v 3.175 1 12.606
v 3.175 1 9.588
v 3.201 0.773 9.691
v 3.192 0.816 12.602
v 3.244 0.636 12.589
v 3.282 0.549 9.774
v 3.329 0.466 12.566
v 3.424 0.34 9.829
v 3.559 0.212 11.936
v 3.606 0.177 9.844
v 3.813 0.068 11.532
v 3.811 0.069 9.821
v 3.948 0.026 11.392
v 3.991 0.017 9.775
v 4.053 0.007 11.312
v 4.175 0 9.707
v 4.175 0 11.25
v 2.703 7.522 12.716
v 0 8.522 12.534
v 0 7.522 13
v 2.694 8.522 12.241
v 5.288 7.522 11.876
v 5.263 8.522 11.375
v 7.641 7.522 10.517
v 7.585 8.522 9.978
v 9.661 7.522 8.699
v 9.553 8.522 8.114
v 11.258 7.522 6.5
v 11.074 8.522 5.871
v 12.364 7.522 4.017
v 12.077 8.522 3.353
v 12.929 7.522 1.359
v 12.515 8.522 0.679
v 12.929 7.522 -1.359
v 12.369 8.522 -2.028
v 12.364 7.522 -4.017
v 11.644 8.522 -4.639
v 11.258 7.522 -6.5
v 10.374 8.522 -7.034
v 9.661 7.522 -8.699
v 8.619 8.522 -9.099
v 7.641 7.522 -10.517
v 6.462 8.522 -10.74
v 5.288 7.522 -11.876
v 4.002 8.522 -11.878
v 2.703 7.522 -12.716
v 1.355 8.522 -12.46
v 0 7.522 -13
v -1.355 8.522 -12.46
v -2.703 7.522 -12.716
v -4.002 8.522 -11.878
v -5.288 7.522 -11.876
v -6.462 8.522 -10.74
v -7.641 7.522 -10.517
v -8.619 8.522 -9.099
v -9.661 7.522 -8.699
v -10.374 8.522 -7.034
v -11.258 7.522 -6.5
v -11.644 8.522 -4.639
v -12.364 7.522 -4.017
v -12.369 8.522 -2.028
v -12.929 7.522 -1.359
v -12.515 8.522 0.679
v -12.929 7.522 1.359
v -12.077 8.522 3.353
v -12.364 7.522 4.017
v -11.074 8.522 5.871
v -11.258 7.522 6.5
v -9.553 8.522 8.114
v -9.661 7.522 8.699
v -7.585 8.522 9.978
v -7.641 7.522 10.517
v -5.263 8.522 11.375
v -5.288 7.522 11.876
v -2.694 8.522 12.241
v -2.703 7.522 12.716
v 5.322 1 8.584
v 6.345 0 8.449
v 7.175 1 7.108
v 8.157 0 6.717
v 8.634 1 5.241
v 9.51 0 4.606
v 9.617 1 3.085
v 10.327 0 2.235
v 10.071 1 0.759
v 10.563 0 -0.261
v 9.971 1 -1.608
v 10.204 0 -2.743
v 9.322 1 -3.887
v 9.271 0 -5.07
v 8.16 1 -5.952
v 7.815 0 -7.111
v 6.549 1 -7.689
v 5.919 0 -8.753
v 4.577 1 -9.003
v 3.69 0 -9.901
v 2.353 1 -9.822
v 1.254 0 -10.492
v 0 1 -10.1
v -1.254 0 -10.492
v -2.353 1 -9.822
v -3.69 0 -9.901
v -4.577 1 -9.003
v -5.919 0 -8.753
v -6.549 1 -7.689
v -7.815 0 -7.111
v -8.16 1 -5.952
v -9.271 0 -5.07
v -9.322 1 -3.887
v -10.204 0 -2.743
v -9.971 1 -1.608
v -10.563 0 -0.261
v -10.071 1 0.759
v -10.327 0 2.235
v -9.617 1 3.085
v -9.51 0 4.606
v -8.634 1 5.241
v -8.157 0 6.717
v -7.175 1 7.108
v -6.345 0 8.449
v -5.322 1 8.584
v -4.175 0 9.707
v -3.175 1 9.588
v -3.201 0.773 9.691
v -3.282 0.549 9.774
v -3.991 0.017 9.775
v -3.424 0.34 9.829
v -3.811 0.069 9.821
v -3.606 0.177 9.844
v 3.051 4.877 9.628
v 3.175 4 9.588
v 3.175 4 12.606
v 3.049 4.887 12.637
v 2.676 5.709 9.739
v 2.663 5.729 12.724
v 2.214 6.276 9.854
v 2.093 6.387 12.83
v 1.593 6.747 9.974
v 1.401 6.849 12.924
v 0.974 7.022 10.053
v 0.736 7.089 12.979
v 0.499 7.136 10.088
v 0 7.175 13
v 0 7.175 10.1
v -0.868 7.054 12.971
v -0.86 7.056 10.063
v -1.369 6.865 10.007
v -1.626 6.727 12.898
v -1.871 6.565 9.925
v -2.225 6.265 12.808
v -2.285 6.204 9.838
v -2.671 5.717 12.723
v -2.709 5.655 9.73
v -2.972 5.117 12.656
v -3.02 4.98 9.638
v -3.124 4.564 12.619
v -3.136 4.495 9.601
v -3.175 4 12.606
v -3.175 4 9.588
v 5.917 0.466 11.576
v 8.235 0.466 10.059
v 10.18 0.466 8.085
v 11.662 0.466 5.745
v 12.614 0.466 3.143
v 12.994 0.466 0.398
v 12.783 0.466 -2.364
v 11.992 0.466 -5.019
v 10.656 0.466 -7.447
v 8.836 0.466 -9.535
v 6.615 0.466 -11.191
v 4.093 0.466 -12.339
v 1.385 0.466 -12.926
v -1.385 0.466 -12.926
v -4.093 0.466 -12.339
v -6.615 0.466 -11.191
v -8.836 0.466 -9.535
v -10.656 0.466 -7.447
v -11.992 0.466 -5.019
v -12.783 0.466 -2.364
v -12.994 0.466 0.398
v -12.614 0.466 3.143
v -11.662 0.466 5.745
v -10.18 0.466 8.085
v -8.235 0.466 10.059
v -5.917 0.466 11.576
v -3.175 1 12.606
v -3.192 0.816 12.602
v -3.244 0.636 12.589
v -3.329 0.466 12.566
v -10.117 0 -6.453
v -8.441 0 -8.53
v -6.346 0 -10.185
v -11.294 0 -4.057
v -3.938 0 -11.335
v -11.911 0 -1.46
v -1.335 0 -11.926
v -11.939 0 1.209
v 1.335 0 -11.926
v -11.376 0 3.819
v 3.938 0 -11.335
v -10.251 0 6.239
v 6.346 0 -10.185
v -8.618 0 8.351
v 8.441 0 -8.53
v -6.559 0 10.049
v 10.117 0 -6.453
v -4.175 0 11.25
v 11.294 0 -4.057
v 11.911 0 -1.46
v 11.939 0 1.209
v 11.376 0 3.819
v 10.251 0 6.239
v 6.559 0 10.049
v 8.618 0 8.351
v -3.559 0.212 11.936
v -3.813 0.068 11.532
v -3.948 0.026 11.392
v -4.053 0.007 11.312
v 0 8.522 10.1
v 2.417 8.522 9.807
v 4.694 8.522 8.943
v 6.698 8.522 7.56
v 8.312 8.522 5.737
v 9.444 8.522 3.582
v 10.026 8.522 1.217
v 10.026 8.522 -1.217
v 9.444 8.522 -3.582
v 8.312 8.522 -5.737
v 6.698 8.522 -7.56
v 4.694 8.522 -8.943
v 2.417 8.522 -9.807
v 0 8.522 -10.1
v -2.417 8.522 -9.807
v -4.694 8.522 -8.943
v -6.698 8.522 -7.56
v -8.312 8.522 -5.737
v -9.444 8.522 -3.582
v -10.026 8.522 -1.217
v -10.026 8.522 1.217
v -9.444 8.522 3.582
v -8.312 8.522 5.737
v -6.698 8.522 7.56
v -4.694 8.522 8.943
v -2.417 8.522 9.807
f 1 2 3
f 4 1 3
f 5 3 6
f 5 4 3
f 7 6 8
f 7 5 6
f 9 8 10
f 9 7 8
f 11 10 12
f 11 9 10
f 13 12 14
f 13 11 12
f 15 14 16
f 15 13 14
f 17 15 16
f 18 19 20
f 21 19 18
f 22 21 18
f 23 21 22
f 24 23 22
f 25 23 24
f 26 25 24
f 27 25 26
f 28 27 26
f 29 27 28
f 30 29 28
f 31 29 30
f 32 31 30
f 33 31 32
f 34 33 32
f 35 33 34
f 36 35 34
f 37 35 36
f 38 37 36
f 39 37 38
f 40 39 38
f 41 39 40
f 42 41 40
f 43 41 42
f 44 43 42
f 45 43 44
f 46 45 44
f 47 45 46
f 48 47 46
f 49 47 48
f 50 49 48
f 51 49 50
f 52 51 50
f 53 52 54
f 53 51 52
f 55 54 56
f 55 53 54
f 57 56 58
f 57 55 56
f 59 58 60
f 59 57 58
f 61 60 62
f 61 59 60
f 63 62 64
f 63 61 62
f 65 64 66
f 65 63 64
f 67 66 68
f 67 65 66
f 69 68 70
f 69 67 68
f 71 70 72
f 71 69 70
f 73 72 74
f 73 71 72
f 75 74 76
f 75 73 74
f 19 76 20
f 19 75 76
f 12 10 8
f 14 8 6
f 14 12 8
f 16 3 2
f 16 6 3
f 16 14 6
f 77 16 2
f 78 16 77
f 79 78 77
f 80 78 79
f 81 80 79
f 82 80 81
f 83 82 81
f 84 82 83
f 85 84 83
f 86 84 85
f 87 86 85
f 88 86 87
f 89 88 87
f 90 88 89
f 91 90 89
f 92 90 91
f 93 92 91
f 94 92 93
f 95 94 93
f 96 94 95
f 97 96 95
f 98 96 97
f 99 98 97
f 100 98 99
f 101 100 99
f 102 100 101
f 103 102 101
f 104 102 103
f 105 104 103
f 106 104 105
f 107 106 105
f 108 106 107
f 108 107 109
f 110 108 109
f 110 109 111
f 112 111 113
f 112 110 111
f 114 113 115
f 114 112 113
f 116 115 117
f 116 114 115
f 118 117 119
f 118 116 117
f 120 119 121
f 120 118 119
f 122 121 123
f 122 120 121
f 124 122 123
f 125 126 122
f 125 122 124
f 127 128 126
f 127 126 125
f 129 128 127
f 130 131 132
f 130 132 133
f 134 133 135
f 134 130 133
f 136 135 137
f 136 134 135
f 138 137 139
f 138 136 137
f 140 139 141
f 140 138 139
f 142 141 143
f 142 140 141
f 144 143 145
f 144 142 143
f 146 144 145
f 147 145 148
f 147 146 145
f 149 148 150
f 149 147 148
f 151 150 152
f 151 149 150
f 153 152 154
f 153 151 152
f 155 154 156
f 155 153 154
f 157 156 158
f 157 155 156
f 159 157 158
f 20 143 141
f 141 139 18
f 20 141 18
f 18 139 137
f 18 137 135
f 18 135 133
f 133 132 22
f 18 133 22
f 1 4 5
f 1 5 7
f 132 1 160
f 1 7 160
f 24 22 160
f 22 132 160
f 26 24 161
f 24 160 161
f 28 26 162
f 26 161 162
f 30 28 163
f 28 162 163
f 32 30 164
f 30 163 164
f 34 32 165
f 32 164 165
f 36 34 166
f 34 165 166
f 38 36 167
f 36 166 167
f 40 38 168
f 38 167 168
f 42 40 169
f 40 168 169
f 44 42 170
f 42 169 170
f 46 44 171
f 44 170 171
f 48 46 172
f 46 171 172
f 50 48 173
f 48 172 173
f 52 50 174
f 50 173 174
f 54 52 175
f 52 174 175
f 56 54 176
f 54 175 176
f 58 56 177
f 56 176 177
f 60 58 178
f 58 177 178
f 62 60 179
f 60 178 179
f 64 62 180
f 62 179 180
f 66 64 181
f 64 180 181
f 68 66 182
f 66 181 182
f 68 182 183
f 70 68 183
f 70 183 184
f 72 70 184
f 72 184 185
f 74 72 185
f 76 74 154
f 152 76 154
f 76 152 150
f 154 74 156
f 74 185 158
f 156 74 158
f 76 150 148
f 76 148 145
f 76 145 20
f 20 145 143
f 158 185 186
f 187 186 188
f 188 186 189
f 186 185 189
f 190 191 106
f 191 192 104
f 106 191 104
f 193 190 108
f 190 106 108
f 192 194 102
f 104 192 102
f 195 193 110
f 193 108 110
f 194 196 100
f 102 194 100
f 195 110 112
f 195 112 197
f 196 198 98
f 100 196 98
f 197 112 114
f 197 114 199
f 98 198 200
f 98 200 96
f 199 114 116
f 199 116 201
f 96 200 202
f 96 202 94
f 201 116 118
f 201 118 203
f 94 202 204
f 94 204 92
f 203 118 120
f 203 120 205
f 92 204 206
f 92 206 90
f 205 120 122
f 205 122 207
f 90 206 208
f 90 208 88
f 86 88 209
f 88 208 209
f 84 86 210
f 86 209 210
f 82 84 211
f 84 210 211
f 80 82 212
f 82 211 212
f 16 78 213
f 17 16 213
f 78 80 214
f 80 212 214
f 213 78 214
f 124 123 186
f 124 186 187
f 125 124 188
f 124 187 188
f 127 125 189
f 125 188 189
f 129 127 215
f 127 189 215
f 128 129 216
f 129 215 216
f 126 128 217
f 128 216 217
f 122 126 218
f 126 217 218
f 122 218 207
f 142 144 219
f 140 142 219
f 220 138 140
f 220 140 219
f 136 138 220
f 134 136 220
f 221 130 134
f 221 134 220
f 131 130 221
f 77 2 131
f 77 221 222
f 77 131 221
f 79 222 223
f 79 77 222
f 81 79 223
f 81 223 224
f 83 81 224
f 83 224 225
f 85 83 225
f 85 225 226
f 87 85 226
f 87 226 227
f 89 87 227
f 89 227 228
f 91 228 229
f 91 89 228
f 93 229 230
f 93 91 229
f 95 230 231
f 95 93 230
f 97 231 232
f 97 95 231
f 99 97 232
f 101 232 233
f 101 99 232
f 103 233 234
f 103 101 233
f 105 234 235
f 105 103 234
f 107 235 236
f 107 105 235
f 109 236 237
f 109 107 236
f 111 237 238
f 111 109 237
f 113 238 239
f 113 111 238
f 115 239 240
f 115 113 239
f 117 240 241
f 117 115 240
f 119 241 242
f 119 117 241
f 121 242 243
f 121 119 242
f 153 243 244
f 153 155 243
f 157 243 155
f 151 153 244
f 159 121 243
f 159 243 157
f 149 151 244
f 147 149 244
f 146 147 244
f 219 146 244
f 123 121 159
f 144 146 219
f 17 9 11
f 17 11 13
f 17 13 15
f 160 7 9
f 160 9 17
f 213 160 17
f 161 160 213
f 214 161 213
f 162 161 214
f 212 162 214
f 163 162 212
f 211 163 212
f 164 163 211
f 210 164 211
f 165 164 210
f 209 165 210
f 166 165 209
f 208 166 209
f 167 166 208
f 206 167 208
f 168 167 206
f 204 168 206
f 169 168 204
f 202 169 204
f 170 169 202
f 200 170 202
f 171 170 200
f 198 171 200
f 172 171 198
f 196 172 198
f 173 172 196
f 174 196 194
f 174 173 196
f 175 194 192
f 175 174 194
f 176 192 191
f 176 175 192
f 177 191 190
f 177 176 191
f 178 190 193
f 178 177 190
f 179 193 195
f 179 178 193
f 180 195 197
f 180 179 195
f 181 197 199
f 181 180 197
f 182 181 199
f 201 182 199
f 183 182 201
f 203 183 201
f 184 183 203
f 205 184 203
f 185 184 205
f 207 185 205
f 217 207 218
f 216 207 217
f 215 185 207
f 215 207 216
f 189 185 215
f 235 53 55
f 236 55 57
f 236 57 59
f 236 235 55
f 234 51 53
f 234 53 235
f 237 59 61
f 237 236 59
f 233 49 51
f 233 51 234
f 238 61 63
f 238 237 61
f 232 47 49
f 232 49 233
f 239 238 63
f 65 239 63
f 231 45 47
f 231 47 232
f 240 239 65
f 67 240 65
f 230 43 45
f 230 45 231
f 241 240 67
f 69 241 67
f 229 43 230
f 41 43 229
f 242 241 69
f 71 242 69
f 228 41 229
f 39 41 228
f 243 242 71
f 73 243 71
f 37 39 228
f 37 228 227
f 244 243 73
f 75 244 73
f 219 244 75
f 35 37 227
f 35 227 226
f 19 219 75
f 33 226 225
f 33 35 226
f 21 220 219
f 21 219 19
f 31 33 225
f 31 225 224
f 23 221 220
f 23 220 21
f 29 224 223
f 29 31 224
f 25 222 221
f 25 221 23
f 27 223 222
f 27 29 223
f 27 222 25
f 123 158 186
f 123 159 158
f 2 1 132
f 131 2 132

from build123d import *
from OCP.BRepFilletAPI import BRepFilletAPI_MakeChamfer

# Parameters (mm, degrees)
SKETCH1_R           = 13
SKETCH1_R_2         = 10.1
BOSS_EXTRUDE1_DEPTH = 8.5222
CUT_EXTRUDE1_DEPTH  = 21.263955508
CHAMFER1_SIZE       = 1
CHAMFER1_SIZE2      = 0.466307658
FILLET2_R           = 1


with BuildPart() as part:
    # Sketch1 → Boss-Extrude1 (new body)
    with BuildSketch(Plane(origin=(0, 0, 0), x_dir=(1, 0, 0), z_dir=(0, 1, 0))):
        with Locations(Location((0, 0, 0), (0, 0, 270))):
            Circle(SKETCH1_R)
        with Locations(Location((0, 0, 0), (0, 0, 270))):
            Circle(SKETCH1_R_2, mode=Mode.SUBTRACT)
    extrude(amount=BOSS_EXTRUDE1_DEPTH)

    # Sketch2 → Cut-Extrude1 (cut, through all)
    with BuildSketch(Plane.XY):
        with BuildLine():
            Line((-3.175, 4), (-3.175, 0))
            Line((-3.175, 0), (3.175, 0))
            Line((3.175, 0), (3.175, 4))
            ThreePointArc((3.175, 4), (0, 7.175), (-3.175, 4))
        make_face()
    extrude(amount=CUT_EXTRUDE1_DEPTH, mode=Mode.SUBTRACT)

    # Chamfer1: one chamfer whose edges measure the first distance from different faces: ONE call of the kernel's chamfer builder (chamfer() names one face for all edges)
    chamfer1_edges_1 = [part.edges().sort_by_distance(p)[0] for p in [
        (0, 0, -13),
    ]]
    chamfer1_side_1 = [part.faces().sort_by_distance(p)[0] for p in [
        (3.539922426, 0, 11.097151788),
    ]]
    chamfer1_edges_2 = [part.edges().sort_by_distance(p)[0] for p in [
        (0, 8.5222, -13),
    ]]
    chamfer1_side_2 = [part.faces().sort_by_distance(p)[0] for p in [
        (0, 4.2611, -13),
    ]]
    chamfer1_edges_3 = [part.edges().sort_by_distance(p)[0] for p in [
        (0, 0, -10.1),
    ]]
    chamfer1_side_3 = [part.faces().sort_by_distance(p)[0] for p in [
        (0, 4.2611, -10.1),
    ]]
    chamfer1 = BRepFilletAPI_MakeChamfer(part.part.solid().wrapped)
    for e in chamfer1_edges_1:
        chamfer1.Add(CHAMFER1_SIZE, CHAMFER1_SIZE2, e.wrapped, chamfer1_side_1[0].wrapped)  # the first distance lies on this face
    for e in chamfer1_edges_2:
        chamfer1.Add(CHAMFER1_SIZE, CHAMFER1_SIZE2, e.wrapped, chamfer1_side_2[0].wrapped)  # the first distance lies on this face
    for e in chamfer1_edges_3:
        chamfer1.Add(CHAMFER1_SIZE, CHAMFER1_SIZE2, e.wrapped, chamfer1_side_3[0].wrapped)  # the first distance lies on this face
    add(Compound.cast(chamfer1.Shape()), mode=Mode.REPLACE)

    # Fillet2
    fillet2_edges = [part.edges().sort_by_distance(p)[0] for p in [
        (3.175, 0, 10.825180639),
        (-3.175, 0, 10.825180639),
    ]]
    fillet(fillet2_edges, radius=FILLET2_R)


solid = part.part
